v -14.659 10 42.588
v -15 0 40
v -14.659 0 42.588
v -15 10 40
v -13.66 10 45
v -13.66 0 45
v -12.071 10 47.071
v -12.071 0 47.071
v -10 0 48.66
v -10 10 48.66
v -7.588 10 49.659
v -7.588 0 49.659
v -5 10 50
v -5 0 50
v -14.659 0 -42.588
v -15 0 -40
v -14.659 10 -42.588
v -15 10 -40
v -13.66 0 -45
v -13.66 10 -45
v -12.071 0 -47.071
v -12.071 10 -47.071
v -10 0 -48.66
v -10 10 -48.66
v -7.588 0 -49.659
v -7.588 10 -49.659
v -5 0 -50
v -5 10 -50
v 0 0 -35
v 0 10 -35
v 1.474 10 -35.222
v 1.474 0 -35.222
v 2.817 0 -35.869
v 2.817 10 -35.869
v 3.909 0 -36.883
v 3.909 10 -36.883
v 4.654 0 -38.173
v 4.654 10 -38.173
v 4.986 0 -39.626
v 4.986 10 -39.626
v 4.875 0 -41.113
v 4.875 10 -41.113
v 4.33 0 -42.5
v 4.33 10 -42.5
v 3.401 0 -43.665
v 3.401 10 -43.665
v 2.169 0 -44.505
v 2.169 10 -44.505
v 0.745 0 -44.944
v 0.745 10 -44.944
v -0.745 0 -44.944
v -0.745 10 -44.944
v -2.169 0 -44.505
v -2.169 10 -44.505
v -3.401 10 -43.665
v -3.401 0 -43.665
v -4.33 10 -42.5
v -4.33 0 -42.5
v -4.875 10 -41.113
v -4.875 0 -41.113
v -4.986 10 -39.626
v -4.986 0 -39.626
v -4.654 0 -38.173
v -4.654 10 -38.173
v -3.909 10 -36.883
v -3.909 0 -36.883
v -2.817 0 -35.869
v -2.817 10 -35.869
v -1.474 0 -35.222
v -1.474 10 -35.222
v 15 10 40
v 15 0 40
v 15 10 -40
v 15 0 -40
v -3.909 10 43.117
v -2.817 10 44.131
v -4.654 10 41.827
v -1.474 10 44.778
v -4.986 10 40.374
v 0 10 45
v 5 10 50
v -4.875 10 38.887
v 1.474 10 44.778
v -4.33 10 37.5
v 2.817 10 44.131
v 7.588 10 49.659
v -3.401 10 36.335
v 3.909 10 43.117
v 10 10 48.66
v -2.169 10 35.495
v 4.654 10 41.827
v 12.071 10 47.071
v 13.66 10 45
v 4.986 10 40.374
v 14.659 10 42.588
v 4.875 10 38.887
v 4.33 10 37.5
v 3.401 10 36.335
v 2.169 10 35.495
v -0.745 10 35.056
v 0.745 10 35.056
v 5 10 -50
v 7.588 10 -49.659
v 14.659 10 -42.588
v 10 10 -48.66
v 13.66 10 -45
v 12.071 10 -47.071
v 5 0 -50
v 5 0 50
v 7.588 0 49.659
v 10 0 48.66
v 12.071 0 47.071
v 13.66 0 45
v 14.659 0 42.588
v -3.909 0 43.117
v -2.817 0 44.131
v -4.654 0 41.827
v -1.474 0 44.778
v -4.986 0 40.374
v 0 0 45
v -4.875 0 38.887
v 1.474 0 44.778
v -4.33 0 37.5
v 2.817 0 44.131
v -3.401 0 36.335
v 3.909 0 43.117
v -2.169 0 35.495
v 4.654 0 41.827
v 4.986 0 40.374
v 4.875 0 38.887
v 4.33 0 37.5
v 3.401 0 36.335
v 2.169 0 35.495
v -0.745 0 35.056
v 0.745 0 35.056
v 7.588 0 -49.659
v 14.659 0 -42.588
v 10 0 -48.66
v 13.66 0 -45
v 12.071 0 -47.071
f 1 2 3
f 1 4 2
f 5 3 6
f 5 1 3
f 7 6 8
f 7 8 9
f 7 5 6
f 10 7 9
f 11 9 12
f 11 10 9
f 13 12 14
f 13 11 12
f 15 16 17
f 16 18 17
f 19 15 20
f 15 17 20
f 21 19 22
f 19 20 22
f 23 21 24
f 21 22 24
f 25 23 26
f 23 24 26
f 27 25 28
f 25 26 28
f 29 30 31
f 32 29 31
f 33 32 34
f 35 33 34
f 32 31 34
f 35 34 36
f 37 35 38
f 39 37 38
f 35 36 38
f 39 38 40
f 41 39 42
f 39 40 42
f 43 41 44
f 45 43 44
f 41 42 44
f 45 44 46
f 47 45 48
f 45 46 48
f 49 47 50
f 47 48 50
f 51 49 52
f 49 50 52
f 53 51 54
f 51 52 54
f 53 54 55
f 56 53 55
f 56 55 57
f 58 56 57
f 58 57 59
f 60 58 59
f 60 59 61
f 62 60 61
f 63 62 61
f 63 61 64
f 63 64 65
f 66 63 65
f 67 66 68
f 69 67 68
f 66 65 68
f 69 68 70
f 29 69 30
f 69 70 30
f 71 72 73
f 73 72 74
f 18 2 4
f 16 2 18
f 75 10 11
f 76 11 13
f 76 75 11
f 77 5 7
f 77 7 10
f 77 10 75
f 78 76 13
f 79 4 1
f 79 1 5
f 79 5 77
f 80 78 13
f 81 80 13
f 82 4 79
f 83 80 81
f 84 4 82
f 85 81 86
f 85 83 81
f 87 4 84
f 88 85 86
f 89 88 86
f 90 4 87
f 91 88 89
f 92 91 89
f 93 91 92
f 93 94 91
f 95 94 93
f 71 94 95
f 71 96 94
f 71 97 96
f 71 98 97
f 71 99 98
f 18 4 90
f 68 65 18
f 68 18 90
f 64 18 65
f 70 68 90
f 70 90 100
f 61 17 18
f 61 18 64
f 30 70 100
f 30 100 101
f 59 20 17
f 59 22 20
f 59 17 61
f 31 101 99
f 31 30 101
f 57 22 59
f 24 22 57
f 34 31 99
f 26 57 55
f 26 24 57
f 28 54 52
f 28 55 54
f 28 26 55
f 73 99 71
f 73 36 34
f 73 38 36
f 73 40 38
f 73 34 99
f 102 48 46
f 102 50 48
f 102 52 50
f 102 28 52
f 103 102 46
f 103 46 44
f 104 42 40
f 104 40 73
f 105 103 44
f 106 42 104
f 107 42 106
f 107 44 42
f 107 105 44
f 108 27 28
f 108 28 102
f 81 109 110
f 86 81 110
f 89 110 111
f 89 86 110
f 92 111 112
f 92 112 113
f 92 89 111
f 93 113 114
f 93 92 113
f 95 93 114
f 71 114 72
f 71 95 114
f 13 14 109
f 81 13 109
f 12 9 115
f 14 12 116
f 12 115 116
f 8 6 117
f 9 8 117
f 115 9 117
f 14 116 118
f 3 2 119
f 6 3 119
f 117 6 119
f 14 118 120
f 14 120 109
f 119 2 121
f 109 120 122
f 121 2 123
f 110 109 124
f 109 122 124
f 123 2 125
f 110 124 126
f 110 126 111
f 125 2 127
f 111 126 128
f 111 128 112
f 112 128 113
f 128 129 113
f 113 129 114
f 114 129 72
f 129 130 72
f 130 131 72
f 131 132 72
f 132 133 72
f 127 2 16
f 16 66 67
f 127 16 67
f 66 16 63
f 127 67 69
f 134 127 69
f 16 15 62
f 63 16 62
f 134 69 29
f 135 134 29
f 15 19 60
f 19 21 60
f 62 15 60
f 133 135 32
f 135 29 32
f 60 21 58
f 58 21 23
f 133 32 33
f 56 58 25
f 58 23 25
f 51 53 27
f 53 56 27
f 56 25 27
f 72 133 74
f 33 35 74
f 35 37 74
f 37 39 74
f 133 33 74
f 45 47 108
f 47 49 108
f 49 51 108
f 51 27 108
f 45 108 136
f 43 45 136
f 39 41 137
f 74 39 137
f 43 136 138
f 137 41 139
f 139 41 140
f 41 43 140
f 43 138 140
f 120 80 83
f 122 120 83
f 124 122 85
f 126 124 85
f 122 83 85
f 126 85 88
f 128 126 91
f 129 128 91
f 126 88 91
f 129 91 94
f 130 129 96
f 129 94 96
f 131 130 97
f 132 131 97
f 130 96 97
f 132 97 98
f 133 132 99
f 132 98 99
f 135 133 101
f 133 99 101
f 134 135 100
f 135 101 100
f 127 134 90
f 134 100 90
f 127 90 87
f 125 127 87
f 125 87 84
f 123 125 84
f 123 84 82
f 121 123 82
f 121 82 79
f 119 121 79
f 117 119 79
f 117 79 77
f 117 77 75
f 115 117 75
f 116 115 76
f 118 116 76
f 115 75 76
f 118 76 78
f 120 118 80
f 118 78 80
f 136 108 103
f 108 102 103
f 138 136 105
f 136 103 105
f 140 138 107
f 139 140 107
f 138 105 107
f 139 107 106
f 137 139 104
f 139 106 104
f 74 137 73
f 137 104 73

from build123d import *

# Parameters (mm, degrees)
SKETCH1_W           = 30
SKETCH1_H           = 100
BOSS_EXTRUDE1_DEPTH = 10
SKETCH2_R           = 5
CUT_EXTRUDE1_DEPTH  = 10
FILLET1_R           = 10
FILLET2_R           = 10


with BuildPart() as part:
    # Sketch1 → Boss-Extrude1 (new body)
    with BuildSketch(Plane(origin=(0, 0, 0), x_dir=(1, 0, 0), z_dir=(0, 1, 0))):
        Rectangle(SKETCH1_W, SKETCH1_H)
    extrude(amount=BOSS_EXTRUDE1_DEPTH)

    # Sketch2 → Cut-Extrude1 (cut)
    with BuildSketch(Plane(origin=(0, 10, 0), x_dir=(1, 0, 0), z_dir=(0, 1, 0))):
        with Locations(Location((0, 40, 0), (0, 0, 270))):
            Circle(SKETCH2_R)
        with Locations(Location((0, -40, 0), (0, 0, 270))):
            Circle(SKETCH2_R)
    extrude(amount=-CUT_EXTRUDE1_DEPTH, mode=Mode.SUBTRACT)

    # Fillet1
    fillet1_edges = [part.edges().sort_by_distance(p)[0] for p in [
        (15, 5, 50),
        (-15, 5, 50),
    ]]
    fillet(fillet1_edges, radius=FILLET1_R)

    # Fillet2
    fillet2_edges = [part.edges().sort_by_distance(p)[0] for p in [
        (-15, 5, -50),
        (15, 5, -50),
    ]]
    fillet(fillet2_edges, radius=FILLET2_R)


solid = part.part
